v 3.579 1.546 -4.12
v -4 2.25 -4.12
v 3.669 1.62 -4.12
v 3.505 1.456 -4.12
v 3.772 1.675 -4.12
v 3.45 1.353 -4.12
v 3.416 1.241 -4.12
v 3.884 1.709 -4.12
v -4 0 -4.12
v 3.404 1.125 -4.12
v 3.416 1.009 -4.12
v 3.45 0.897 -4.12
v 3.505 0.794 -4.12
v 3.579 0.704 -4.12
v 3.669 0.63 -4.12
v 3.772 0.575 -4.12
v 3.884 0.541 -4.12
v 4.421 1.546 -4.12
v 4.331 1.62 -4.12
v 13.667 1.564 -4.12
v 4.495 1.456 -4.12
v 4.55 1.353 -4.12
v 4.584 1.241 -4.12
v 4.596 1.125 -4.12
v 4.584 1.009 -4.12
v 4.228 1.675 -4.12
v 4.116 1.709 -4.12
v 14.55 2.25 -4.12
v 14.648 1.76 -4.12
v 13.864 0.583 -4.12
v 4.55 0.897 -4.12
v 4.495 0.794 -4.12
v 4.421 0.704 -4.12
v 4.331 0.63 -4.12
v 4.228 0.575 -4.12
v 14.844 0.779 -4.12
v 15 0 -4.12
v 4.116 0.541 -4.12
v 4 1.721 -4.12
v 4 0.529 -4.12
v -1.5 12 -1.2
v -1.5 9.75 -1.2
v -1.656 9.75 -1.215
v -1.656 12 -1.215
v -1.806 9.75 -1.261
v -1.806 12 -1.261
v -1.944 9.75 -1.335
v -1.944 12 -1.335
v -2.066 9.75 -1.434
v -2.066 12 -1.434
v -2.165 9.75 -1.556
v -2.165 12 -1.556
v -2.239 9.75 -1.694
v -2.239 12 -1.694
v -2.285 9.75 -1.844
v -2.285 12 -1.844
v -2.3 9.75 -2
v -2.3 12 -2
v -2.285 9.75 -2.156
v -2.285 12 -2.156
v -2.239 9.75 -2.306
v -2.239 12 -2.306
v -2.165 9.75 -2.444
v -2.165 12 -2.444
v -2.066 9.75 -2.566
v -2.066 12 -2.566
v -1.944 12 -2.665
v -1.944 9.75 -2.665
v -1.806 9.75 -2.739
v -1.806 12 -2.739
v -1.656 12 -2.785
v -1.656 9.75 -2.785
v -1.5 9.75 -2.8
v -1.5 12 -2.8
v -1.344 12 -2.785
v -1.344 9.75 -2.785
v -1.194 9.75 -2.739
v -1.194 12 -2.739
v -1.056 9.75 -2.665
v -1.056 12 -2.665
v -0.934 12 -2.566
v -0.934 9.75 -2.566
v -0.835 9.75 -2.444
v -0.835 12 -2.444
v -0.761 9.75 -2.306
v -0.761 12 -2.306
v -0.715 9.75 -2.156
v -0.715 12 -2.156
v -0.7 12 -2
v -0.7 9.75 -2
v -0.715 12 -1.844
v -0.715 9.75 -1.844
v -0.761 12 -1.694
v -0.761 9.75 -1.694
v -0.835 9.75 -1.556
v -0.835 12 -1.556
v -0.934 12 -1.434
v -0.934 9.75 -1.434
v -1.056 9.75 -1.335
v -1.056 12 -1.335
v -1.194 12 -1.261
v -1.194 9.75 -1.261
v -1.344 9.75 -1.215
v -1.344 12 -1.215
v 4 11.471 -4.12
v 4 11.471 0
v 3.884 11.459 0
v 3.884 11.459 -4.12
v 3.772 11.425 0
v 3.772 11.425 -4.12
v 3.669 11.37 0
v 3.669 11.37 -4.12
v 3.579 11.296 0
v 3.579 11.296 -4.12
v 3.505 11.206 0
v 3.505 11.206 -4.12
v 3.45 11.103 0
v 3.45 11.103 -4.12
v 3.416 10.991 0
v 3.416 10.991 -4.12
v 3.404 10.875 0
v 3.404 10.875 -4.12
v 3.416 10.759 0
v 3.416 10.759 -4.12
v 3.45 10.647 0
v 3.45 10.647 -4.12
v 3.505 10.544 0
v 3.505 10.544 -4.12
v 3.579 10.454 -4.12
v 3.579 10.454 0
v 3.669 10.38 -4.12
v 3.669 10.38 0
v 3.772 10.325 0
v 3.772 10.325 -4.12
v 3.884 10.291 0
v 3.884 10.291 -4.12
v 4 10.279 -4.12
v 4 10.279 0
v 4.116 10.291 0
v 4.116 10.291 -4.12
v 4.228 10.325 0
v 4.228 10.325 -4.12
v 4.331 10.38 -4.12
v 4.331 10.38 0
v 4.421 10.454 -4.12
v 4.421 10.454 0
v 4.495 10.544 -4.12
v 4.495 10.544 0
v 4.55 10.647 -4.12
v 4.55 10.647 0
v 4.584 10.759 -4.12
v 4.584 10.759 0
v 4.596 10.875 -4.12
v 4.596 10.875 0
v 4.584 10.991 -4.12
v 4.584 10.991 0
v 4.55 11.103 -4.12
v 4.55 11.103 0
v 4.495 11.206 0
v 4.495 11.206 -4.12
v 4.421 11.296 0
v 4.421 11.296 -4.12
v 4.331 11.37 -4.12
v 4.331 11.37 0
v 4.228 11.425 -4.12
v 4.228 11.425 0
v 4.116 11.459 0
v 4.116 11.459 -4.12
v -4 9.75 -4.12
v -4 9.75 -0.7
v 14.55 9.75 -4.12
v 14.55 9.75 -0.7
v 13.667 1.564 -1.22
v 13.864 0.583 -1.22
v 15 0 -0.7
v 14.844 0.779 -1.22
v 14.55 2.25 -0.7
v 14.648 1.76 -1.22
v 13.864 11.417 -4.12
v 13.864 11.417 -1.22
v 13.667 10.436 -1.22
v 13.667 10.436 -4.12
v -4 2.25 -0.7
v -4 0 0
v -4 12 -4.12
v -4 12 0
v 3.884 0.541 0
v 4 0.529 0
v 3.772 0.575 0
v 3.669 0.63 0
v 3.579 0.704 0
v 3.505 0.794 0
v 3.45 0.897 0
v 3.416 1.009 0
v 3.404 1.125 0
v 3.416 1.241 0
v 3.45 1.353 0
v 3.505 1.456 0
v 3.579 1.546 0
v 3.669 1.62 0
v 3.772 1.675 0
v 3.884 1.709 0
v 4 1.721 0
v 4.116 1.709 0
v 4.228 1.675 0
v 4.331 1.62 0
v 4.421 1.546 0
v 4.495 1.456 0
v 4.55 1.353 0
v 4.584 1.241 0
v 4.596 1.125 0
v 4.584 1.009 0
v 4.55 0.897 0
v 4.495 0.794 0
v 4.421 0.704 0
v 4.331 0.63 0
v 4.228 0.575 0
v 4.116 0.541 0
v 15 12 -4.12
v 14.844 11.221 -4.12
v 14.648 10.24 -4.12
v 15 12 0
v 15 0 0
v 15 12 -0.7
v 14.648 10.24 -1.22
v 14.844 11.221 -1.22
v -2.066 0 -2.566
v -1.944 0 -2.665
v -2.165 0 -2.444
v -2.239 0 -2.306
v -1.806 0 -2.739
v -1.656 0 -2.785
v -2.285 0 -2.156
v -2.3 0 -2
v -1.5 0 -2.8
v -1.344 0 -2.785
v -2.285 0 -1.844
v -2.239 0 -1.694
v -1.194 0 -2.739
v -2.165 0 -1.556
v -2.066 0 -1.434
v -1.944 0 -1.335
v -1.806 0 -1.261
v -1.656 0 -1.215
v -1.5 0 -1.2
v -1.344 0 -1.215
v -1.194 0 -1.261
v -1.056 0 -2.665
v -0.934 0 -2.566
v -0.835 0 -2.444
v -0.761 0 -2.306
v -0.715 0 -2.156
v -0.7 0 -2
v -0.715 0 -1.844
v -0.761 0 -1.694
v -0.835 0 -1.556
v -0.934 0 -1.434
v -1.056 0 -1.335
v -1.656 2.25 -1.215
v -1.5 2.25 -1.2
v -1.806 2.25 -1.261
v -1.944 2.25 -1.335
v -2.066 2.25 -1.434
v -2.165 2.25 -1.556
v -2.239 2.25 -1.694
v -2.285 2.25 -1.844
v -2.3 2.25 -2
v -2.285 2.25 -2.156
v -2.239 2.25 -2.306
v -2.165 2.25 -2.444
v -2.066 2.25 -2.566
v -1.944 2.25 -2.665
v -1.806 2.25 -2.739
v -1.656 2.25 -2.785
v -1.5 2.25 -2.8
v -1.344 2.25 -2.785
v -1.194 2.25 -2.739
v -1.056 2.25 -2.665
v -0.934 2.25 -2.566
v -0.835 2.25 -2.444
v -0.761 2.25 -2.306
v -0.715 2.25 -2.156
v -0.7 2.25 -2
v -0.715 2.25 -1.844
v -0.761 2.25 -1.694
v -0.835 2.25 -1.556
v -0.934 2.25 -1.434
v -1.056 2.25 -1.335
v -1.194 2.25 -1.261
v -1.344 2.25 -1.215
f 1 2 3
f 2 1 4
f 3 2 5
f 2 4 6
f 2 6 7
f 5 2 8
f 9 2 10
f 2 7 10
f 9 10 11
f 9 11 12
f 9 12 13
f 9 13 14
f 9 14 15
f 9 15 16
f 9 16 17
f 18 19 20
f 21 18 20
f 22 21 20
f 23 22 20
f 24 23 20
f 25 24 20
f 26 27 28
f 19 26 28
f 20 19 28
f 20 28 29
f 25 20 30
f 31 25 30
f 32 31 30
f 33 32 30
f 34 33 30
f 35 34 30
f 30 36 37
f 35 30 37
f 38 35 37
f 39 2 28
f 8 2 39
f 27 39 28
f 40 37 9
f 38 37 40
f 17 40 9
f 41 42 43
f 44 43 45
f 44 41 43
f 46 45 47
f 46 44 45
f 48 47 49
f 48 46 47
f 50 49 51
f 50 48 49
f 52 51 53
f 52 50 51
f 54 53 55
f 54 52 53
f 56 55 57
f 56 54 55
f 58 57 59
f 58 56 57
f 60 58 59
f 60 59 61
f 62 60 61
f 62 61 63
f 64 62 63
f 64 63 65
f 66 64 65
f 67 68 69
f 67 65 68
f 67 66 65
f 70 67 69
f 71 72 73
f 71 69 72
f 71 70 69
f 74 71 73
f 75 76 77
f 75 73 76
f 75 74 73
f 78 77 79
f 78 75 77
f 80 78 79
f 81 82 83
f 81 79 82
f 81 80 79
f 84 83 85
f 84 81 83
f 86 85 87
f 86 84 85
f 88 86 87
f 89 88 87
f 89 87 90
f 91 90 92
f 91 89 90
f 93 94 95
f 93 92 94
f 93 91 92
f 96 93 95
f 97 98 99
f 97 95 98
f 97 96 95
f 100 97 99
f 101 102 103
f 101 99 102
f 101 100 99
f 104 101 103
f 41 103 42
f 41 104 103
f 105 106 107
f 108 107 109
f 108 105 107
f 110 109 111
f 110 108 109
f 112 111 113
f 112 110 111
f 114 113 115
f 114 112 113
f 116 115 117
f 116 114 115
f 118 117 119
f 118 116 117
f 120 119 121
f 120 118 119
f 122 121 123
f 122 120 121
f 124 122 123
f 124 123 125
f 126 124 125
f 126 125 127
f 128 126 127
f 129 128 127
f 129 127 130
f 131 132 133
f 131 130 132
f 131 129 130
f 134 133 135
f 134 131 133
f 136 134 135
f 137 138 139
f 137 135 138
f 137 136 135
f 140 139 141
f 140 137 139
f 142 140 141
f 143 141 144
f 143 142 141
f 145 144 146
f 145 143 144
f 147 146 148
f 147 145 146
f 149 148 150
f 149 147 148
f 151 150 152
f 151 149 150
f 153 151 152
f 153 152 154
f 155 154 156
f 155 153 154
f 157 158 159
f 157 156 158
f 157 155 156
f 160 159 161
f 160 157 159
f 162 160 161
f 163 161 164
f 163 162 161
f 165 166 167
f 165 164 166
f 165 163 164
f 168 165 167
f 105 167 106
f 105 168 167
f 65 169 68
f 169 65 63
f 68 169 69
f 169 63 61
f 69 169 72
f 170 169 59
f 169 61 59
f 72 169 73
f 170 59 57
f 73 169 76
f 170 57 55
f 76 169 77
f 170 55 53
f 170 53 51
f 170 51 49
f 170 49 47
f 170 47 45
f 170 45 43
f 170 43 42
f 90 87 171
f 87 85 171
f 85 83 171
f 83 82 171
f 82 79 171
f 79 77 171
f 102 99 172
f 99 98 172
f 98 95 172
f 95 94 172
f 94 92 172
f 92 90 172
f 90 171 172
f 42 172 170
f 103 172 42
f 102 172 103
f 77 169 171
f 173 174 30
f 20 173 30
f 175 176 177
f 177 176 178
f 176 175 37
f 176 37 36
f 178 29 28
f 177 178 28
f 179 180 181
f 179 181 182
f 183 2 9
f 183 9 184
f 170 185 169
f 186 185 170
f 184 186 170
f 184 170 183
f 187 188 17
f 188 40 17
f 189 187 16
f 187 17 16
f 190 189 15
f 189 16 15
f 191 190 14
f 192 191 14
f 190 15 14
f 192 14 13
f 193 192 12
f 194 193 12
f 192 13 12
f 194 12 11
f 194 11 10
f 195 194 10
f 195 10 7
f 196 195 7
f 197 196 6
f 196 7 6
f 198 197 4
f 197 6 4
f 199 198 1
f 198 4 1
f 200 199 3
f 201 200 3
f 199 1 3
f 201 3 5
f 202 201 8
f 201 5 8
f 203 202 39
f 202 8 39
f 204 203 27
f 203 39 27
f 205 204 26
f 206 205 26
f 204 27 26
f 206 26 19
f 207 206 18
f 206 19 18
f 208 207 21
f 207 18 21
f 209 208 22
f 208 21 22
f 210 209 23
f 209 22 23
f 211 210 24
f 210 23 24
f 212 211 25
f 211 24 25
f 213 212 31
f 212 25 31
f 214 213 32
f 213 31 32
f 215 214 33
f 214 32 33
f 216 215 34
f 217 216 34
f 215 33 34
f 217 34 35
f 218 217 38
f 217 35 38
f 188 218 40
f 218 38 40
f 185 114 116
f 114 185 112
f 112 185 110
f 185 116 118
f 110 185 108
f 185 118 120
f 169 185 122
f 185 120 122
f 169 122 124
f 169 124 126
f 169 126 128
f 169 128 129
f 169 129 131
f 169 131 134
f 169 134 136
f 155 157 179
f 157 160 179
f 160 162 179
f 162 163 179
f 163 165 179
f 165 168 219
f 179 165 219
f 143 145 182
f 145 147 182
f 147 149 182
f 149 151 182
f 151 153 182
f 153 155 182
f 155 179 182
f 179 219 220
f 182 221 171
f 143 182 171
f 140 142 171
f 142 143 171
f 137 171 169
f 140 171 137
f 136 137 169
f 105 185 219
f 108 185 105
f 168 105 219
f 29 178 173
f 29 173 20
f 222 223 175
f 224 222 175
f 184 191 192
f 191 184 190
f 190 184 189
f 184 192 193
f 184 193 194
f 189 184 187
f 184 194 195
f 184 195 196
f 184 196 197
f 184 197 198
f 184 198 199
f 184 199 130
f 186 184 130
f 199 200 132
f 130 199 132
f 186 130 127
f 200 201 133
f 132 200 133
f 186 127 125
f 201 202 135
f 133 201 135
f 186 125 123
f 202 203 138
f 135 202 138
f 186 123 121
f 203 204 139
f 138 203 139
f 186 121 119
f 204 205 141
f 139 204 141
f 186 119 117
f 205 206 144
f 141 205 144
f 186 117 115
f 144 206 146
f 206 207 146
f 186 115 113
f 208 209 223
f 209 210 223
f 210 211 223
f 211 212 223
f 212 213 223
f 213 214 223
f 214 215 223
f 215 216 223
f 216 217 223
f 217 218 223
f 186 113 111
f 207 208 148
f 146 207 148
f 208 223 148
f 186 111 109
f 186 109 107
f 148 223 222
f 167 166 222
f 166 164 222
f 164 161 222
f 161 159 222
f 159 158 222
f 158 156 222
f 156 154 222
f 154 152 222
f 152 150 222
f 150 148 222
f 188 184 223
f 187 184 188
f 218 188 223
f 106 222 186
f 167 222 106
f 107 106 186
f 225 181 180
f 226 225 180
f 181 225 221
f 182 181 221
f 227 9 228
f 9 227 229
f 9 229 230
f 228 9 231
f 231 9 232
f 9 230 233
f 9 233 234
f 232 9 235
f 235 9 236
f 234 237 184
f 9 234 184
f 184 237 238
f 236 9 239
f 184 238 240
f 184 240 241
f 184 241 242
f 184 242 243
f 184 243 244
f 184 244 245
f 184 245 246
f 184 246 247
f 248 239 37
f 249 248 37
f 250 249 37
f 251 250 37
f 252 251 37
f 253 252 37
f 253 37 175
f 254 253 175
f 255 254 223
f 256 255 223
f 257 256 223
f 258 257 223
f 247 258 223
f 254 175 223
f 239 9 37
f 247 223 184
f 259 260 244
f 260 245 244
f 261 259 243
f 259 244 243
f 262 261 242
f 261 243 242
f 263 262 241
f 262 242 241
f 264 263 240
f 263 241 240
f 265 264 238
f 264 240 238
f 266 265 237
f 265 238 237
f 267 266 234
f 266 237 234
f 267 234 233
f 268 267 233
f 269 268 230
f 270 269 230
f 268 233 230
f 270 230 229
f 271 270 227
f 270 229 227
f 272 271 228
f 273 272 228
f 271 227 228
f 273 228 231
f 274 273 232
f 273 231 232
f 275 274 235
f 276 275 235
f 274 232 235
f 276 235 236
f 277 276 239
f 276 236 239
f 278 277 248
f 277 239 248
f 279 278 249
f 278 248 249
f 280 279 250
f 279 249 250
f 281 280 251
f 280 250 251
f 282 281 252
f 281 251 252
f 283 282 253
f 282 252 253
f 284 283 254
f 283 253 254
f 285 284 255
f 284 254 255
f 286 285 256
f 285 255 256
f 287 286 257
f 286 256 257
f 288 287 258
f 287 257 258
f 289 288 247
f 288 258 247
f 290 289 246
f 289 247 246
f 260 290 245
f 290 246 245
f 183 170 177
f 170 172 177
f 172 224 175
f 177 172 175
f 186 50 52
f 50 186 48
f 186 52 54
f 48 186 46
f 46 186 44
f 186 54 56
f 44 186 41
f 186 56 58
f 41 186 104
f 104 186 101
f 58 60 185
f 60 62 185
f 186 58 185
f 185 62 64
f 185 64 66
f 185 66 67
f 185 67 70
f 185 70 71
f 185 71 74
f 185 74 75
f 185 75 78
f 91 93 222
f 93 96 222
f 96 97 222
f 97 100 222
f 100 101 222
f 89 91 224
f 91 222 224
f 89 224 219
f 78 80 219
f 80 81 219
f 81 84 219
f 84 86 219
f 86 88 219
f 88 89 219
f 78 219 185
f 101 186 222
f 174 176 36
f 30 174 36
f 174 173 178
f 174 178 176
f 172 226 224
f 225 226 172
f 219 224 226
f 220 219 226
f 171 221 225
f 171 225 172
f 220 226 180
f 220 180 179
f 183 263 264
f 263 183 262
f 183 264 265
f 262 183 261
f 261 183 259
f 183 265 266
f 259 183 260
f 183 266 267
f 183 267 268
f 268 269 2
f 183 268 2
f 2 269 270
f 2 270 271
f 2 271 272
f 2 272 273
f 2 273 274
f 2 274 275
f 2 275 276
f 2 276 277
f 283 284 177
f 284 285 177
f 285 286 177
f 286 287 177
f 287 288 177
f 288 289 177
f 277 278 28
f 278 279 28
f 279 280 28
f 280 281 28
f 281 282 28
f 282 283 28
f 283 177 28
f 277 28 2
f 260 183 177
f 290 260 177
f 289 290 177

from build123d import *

# Parameters (mm, degrees)
SKETCH1_W           = 15
SKETCH1_H           = 4.12
BOSS_EXTRUDE1_DEPTH = 12
SKETCH3_W           = 3.42
SKETCH3_H           = 7.5
CUT_EXTRUDE1_DEPTH  = 25
CUT_EXTRUDE3_DEPTH  = 3.42
SKETCH7_W           = 2.9
SKETCH7_H           = 1
CUT_EXTRUDE4_DEPTH  = 1
BOSS_EXTRUDE2_DEPTH = 4


with BuildPart() as part:
    # Sketch1 → Boss-Extrude1 (new body)
    with BuildSketch(Plane(origin=(0, 0, 0), x_dir=(1, 0, 0), z_dir=(0, 1, 0))):
        with Locations((7.5, 2.06)):
            Rectangle(SKETCH1_W, SKETCH1_H)
    extrude(amount=BOSS_EXTRUDE1_DEPTH)

    # Sketch3 → Cut-Extrude1 (cut)
    with BuildSketch(Plane.ZY):
        with Locations((-2.41, 6)):
            Rectangle(SKETCH3_W, SKETCH3_H)
    extrude(amount=-CUT_EXTRUDE1_DEPTH, mode=Mode.SUBTRACT)

    # Sketch5 → Cut-Extrude3 (cut)
    with BuildSketch(Plane(origin=(0, 0, -4.12), x_dir=(-1, 0, 0), z_dir=(0, 0, -1))):
        Polygon((-15, 12), (-14.55, 9.75), (-15, 9.75), align=None)
    cut_extrude3 = extrude(amount=-CUT_EXTRUDE3_DEPTH, mode=Mode.SUBTRACT)

    # Mirror2: Cut-Extrude3 across plane
    add(cut_extrude3.mirror(Plane(origin=(0, 6, 0), x_dir=(0, 0, 1), z_dir=(0, -1, 0))), mode=Mode.SUBTRACT)

    # Sketch7 → Cut-Extrude4 (cut)
    with BuildSketch(Plane(origin=(12.115384617, -2.423076922, 0), x_dir=(0, 0, -1), z_dir=(0.9805806757046813, -0.19611613506937897, 0))):
        with Locations((2.67, 13.414151353)):
            Rectangle(SKETCH7_W, SKETCH7_H)
    cut_extrude4 = extrude(amount=-CUT_EXTRUDE4_DEPTH, mode=Mode.SUBTRACT)

    # Sketch10 → #0-80 Tapped Hole1 (revolve, cut)
    with BuildSketch(Plane(origin=(4, 10.875, -4.12), x_dir=(0, 1, 0), z_dir=(1, 0, 0))):
        Polygon((0, 0), (0, 5.307890611), (0.59563, 4.95), (0.59563, 0), align=None)
    f_0_80_tapped_hole1 = revolve(axis=Axis((4, 10.875, -10.47), (0, 0, 1)), mode=Mode.SUBTRACT)

    # Sketch12 → Boss-Extrude2 (add)
    with BuildSketch(Plane.ZY):
        Polygon((0, 0), (0, 12), (-4.12, 12), (-4.12, 9.75), (-0.7, 9.75), (-0.7, 2.25), (-4.12, 2.25), (-4.12, 0), align=None)
    extrude(amount=BOSS_EXTRUDE2_DEPTH)

    # Sketch15 → M2x0.4 Tapped Hole1 (revolve, cut)
    with BuildSketch(Plane(origin=(-1.5, 12, -2), x_dir=(0, 0, 1), z_dir=(1, 0, 0))):
        Polygon((0, 0), (0, 5.680688495), (0.8, 5.2), (0.8, 0), align=None)
    m2x0_4_tapped_hole1 = revolve(axis=Axis((-1.5, 18.35, -2), (0, -1, 0)), mode=Mode.SUBTRACT)

    # Mirror3: Cut-Extrude4, #0-80 Tapped Hole1, M2x0.4 Tapped Hole1 across plane
    add(cut_extrude4.mirror(Plane(origin=(0, 6, 0), x_dir=(0, 0, 1), z_dir=(0, -1, 0))), mode=Mode.SUBTRACT)
    add(f_0_80_tapped_hole1.mirror(Plane(origin=(0, 6, 0), x_dir=(0, 0, 1), z_dir=(0, -1, 0))), mode=Mode.SUBTRACT)
    add(m2x0_4_tapped_hole1.mirror(Plane(origin=(0, 6, 0), x_dir=(0, 0, 1), z_dir=(0, -1, 0))), mode=Mode.SUBTRACT)


solid = part.part
